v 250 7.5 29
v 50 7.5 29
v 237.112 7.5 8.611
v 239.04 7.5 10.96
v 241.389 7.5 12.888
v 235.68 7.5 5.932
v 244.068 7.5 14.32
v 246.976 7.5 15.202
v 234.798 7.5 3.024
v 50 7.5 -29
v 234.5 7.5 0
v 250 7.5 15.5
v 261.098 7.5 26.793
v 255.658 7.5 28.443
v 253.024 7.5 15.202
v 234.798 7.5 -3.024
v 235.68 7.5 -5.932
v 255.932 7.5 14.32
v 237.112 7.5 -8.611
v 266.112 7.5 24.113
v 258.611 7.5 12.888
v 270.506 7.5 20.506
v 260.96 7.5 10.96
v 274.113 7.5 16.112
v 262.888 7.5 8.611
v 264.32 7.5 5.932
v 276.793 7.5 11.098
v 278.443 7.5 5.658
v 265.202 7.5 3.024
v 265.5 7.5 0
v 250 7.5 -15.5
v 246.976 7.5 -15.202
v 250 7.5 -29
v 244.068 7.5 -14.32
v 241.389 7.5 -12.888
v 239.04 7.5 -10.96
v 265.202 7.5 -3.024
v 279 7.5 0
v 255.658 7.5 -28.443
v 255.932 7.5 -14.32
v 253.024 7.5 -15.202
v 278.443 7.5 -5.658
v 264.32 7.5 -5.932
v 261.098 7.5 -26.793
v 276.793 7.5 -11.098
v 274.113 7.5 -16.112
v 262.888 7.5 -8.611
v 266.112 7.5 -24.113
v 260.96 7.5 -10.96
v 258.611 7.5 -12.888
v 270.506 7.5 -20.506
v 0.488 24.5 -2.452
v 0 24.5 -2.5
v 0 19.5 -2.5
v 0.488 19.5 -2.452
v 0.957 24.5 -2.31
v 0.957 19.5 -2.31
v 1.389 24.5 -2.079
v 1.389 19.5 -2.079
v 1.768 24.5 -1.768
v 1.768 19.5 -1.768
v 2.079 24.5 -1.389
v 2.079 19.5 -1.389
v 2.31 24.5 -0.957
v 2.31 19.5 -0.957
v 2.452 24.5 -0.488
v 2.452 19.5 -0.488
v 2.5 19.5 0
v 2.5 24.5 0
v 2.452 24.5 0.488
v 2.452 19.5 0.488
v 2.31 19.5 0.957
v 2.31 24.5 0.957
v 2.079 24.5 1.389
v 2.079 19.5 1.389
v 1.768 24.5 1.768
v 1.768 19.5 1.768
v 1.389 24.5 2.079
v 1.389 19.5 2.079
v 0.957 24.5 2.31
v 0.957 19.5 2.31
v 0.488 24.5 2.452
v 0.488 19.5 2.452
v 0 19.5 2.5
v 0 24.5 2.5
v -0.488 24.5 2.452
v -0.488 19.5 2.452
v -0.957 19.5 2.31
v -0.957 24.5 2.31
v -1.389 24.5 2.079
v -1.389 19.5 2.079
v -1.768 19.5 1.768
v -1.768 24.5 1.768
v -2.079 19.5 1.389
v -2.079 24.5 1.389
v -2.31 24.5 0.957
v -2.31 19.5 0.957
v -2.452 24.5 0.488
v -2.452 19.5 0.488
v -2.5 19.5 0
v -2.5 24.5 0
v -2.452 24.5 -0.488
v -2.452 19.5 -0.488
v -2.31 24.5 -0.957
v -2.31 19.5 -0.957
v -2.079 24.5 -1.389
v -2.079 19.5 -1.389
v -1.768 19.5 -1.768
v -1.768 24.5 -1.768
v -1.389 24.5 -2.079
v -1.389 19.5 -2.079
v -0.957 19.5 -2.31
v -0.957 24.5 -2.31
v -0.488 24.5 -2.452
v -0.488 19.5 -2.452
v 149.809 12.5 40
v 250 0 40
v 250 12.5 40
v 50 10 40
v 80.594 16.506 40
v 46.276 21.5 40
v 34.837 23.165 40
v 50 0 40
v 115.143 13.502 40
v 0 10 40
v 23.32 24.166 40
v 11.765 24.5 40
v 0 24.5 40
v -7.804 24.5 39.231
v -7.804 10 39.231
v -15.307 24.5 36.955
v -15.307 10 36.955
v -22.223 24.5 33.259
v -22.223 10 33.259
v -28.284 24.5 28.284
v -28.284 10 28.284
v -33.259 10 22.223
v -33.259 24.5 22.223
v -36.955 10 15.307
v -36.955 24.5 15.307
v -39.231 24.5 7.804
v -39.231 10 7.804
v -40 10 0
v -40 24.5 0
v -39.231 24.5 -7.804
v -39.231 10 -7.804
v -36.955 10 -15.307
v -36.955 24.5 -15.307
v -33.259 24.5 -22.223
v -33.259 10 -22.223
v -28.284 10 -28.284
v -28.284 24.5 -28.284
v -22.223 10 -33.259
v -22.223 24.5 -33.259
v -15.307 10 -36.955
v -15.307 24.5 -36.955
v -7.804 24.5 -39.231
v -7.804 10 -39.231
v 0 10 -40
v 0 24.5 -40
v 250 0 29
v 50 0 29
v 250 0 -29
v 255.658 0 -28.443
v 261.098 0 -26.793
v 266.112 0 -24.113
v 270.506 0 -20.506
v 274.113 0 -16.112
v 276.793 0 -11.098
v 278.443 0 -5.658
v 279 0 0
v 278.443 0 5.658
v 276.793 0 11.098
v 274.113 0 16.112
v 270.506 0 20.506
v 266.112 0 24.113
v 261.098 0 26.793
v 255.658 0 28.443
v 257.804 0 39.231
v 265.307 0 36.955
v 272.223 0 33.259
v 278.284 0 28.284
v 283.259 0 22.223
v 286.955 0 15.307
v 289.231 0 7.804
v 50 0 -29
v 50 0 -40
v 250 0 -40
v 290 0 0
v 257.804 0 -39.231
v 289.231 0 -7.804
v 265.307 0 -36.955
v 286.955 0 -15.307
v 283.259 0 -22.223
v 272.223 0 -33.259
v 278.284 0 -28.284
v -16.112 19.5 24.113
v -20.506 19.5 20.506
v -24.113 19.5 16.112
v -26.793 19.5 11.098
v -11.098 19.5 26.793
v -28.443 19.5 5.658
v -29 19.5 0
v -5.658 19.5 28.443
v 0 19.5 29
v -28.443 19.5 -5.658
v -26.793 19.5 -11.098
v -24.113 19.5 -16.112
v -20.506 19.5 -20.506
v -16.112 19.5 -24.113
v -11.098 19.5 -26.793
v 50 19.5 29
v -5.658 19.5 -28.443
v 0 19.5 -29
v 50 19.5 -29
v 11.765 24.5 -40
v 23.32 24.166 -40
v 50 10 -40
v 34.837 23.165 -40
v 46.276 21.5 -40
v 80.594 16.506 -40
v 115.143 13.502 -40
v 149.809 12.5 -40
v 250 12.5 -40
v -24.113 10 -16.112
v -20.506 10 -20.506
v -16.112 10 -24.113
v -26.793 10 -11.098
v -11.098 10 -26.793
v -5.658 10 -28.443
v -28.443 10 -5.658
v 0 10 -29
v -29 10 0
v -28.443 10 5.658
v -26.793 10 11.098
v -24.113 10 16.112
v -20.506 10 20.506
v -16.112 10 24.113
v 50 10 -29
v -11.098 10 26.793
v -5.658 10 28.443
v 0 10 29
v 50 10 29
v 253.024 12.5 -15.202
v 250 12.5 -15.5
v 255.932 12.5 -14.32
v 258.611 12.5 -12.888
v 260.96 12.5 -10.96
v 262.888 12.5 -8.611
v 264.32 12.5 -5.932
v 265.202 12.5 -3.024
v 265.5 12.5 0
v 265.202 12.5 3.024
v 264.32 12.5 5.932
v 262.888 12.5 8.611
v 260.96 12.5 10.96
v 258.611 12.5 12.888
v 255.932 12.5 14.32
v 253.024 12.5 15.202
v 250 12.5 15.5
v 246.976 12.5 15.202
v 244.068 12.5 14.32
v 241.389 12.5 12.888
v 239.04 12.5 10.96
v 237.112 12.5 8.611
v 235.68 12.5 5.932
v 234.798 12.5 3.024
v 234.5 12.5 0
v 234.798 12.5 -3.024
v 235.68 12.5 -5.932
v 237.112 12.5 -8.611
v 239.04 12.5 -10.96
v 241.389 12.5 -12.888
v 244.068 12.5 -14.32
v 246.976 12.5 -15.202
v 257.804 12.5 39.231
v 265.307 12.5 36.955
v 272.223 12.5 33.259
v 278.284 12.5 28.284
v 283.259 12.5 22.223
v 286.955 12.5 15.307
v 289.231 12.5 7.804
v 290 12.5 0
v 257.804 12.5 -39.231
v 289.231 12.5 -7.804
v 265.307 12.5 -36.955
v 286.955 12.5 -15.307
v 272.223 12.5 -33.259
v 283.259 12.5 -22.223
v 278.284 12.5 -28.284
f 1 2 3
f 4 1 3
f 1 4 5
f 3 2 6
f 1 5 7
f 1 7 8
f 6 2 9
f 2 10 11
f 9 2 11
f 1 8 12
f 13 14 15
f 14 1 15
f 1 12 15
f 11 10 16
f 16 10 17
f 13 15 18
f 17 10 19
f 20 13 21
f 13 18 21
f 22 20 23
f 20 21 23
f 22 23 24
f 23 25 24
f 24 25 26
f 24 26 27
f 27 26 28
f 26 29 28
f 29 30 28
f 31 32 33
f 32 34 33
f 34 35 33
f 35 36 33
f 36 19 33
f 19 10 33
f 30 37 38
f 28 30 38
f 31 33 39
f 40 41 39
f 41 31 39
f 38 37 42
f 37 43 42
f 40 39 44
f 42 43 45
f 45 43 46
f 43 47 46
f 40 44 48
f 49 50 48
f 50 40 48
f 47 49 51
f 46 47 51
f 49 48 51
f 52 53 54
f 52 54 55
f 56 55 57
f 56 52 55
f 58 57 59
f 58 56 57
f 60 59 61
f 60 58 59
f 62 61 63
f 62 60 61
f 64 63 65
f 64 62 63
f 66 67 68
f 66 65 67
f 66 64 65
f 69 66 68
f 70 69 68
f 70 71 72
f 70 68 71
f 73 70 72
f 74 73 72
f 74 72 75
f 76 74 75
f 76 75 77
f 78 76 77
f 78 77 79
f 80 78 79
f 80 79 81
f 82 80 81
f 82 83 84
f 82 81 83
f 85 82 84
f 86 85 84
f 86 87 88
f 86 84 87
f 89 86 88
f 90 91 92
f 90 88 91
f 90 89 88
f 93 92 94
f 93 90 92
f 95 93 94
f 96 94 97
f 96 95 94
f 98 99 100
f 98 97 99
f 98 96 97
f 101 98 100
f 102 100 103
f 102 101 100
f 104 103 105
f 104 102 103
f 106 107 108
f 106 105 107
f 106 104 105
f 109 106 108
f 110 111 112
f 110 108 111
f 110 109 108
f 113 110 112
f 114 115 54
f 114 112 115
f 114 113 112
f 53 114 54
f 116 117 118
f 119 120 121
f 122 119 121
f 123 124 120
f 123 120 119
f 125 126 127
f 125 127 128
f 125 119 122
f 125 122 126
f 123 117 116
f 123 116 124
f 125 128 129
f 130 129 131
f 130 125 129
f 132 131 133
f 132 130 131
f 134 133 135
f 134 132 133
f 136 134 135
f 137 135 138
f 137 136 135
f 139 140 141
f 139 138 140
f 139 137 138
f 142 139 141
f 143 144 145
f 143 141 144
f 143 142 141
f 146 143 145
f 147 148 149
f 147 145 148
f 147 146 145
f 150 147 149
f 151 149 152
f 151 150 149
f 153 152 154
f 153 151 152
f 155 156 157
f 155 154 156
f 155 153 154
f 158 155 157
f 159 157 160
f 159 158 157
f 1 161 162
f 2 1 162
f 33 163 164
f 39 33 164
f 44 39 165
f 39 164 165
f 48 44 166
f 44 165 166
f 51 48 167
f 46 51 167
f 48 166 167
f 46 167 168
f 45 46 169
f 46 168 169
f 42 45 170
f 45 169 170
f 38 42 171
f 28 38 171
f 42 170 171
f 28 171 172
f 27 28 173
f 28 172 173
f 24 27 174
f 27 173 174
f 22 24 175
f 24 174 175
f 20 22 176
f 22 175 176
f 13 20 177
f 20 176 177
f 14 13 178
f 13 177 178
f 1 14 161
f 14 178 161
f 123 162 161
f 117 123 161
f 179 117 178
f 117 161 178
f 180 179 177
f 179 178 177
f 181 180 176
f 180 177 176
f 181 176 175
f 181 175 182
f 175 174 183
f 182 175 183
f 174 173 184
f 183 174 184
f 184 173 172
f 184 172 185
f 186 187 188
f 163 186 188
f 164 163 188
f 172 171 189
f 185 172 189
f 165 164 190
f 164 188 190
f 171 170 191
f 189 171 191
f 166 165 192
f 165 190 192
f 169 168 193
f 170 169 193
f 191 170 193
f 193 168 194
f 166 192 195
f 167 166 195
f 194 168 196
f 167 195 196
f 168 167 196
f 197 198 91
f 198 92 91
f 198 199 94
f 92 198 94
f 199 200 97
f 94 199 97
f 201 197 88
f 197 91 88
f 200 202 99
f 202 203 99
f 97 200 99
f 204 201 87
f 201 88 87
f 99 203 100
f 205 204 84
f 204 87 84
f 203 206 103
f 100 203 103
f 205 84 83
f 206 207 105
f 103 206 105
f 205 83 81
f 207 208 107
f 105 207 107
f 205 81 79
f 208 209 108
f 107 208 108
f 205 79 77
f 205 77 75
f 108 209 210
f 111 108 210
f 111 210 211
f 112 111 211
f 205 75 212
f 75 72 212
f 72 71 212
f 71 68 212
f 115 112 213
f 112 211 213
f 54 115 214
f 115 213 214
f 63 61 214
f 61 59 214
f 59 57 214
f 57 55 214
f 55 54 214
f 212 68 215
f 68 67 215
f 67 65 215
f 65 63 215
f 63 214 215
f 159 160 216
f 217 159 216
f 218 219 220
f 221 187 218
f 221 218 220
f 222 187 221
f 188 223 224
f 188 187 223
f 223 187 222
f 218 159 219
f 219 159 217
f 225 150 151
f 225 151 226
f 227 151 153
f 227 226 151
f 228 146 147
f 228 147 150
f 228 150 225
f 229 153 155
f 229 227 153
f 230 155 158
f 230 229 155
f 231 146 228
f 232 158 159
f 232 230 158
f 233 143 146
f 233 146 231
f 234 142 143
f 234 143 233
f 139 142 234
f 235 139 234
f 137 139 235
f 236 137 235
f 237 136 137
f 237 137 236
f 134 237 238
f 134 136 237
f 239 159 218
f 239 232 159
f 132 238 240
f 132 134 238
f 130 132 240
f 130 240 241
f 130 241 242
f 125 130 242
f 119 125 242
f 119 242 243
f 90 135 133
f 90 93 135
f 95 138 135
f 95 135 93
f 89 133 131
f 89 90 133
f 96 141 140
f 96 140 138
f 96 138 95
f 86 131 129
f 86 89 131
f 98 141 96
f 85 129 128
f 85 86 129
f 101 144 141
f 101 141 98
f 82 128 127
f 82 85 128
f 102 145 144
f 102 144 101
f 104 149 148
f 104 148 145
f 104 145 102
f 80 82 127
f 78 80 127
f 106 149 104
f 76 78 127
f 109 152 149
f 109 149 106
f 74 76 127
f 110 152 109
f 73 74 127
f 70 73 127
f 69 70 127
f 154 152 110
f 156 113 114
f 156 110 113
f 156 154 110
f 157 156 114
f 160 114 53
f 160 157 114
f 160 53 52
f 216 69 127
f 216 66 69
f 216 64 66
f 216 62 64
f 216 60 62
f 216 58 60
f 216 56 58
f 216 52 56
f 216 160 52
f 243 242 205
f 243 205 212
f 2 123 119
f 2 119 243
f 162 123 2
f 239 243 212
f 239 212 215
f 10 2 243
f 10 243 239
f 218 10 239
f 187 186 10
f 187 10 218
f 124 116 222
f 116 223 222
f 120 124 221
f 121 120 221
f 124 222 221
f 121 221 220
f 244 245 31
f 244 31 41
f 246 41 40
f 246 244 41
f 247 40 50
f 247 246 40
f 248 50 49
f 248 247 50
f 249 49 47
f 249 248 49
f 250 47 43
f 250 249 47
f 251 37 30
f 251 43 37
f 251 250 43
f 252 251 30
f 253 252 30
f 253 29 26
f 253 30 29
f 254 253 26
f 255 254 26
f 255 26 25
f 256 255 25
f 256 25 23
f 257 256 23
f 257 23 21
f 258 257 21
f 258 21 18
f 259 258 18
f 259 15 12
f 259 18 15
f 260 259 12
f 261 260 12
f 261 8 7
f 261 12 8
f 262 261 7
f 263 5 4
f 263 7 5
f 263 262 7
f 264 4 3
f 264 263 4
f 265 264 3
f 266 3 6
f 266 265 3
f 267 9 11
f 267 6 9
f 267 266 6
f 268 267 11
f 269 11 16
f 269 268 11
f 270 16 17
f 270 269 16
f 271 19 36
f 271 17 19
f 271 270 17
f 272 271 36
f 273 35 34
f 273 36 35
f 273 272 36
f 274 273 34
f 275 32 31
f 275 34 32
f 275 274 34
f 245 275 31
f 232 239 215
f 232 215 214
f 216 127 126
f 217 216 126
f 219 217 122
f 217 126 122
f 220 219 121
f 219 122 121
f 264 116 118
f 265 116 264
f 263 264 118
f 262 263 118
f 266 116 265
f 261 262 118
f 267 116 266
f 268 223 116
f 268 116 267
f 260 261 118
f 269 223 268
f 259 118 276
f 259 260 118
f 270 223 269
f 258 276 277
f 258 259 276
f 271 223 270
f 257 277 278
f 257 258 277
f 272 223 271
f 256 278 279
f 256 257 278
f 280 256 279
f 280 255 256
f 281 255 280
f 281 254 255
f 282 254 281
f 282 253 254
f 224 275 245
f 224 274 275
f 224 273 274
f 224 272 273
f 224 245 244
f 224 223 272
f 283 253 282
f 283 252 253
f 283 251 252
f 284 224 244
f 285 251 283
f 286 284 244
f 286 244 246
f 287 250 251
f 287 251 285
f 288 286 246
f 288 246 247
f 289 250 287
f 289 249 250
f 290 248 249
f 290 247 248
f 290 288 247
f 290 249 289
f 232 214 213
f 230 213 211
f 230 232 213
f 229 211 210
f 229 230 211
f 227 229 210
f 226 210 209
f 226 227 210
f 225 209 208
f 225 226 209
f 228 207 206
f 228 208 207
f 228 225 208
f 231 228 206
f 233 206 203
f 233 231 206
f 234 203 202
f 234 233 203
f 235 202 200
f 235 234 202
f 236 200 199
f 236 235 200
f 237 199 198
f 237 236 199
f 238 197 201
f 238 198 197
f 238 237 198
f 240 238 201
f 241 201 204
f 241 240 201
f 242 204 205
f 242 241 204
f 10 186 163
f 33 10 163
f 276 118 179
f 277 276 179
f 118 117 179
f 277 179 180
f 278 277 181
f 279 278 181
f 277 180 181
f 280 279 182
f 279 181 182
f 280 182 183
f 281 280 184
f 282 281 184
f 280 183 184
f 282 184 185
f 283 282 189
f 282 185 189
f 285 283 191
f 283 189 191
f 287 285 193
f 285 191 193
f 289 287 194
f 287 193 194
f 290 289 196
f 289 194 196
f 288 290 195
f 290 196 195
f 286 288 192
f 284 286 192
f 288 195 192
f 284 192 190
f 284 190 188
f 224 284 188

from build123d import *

# Parameters (mm, degrees)
BOSS_EXTRUDE1_DEPTH     = 7.5
CUT_EXTRUDE1_DEPTH      = 293.841680776
CUT_EXTRUDE1_DEPTH_BACK = 293.841680776
BOSS_EXTRUDE3_DEPTH     = 5
CUT_EXTRUDE2_DEPTH      = 293.841680776
CUT_EXTRUDE2_DEPTH_BACK = 293.841680776
SKETCH11_R              = 15.5
SKETCH12_W              = 30
SKETCH12_H              = 11
SKETCH12_H_2            = 58
BOSS_EXTRUDE4_DEPTH     = 7
BOSS_EXTRUDE5_DEPTH     = 5
BOSS_EXTRUDE6_START     = 2.5
BOSS_EXTRUDE6_DEPTH     = 2.5
CUT_EXTRUDE3_DEPTH      = 294.394359182
CUT_EXTRUDE3_DEPTH_BACK = 294.394359182
SKETCH15_R              = 2.5
FILLET1_R               = 200
FILLET2_R               = 600


with BuildPart() as part:
    # Sketch1 → Boss-Extrude1 (new body)
    with BuildSketch(Plane(origin=(0, 0, 0), x_dir=(1, 0, 0), z_dir=(0, 1, 0))):
        with BuildLine():
            Line((0, -40), (250, -40))
            ThreePointArc((250, -40), (290, 0), (250, 40))
            Line((250, 40), (0, 40))
            ThreePointArc((0, 40), (-40, 0), (0, -40))
        make_face()
        with BuildLine():
            Line((0, 29), (250, 29))
            ThreePointArc((250, 29), (279, 0), (250, -29))
            Line((250, -29), (0, -29))
            ThreePointArc((0, -29), (-29, 0), (0, 29))
        make_face(mode=Mode.SUBTRACT)
    extrude(amount=BOSS_EXTRUDE1_DEPTH)

    # Sketch9 → Cut-Extrude1 (cut, two sides: drawn at the far end of the back side and taken through both)
    with BuildSketch(Plane(origin=(0, 7.5, 0), x_dir=(1, 0, 0), z_dir=(0, 1, 0)).offset(-CUT_EXTRUDE1_DEPTH_BACK)):
        with BuildLine():
            Line((50, 29), (50, -29))
            Line((50, -29), (250, -29))
            ThreePointArc((250, -29), (279, 0), (250, 29))
            Line((250, 29), (50, 29))
        make_face()
        with BuildLine():
            Line((0, -40), (50, -40))
            Line((50, -40), (50, -29))
            Line((50, -29), (0, -29))
            ThreePointArc((0, -29), (-29, 0), (0, 29))
            Line((0, 29), (50, 29))
            Line((50, 29), (50, 40))
            Line((50, 40), (0, 40))
            ThreePointArc((0, 40), (-40, 0), (0, -40))
        make_face()
    extrude(amount=CUT_EXTRUDE1_DEPTH + CUT_EXTRUDE1_DEPTH_BACK, mode=Mode.SUBTRACT)

    # Sketch9<3> → Boss-Extrude3 (add)
    with BuildSketch(Plane(origin=(0, 7.5, 0), x_dir=(1, 0, 0), z_dir=(0, 1, 0))):
        with BuildLine():
            Line((50, 40), (50, -40))
            Line((50, -40), (250, -40))
            ThreePointArc((250, -40), (290, 0), (250, 40))
            Line((250, 40), (50, 40))
        make_face()
    extrude(amount=BOSS_EXTRUDE3_DEPTH)

    # Sketch11 → Cut-Extrude2 (cut, two sides: drawn at the far end of the back side and taken through both)
    with BuildSketch(Plane.XZ.offset(-7.5).offset(-CUT_EXTRUDE2_DEPTH_BACK)):
        with Locations(Location((250, 0, 0), (0, 0, 270))):
            Circle(SKETCH11_R)
    extrude(amount=CUT_EXTRUDE2_DEPTH + CUT_EXTRUDE2_DEPTH_BACK, mode=Mode.SUBTRACT)

    # Sketch12 → Boss-Extrude4 (add)
    with BuildSketch(Plane(origin=(0, 12.5, 0), x_dir=(1, 0, 0), z_dir=(0, 1, 0))):
        with Locations((65, -34.5)):
            Rectangle(SKETCH12_W, SKETCH12_H)
        with BuildLine():
            ThreePointArc((0, 40), (-40, 0), (0, -40))
            Line((0, -40), (50, -40))
            Line((50, -40), (50, -29))
            Line((50, -29), (0, -29))
            ThreePointArc((0, -29), (-29, 0), (0, 29))
            Line((0, 29), (50, 29))
            Line((50, 29), (50, 40))
            Line((50, 40), (0, 40))
        make_face()
        with Locations((65, 34.5)):
            Rectangle(SKETCH12_W, SKETCH12_H)
        with Locations((65, 0)):
            Rectangle(SKETCH12_W, SKETCH12_H_2)
    extrude(amount=BOSS_EXTRUDE4_DEPTH)

    # Sketch13 → Boss-Extrude5 (add)
    with BuildSketch(Plane(origin=(0, 19.5, 0), x_dir=(1, 0, 0), z_dir=(0, 1, 0))):
        with BuildLine():
            Line((80, -40), (80, 40))
            Line((80, 40), (0, 40))
            ThreePointArc((0, 40), (-40, 0), (0, -40))
            Line((0, -40), (80, -40))
        make_face()
    extrude(amount=BOSS_EXTRUDE5_DEPTH)

    # Sketch14 → Boss-Extrude6 (add)
    with BuildSketch(Plane.XZ.offset(-12.5).offset(BOSS_EXTRUDE6_START)):
        with BuildLine():
            Line((0, -40), (50, -40))
            Line((50, -40), (50, -29))
            Line((50, -29), (0, -29))
            ThreePointArc((0, -29), (-29, 0), (0, 29))
            Line((0, 29), (50, 29))
            Line((50, 29), (50, 40))
            Line((50, 40), (0, 40))
            ThreePointArc((0, 40), (-40, 0), (0, -40))
        make_face()
    extrude(amount=-BOSS_EXTRUDE6_DEPTH)

    # Sketch15 → Cut-Extrude3 (cut, two sides: drawn at the far end of the back side and taken through both)
    with BuildSketch(Plane.XZ.offset(-19.5).offset(-CUT_EXTRUDE3_DEPTH_BACK)):
        with Locations(Location((0, 0, 0), (0, 0, 270))):
            Circle(SKETCH15_R)
    extrude(amount=CUT_EXTRUDE3_DEPTH + CUT_EXTRUDE3_DEPTH_BACK, mode=Mode.SUBTRACT)

    # Fillet1
    # the kernel refuses this fillet: 200 mm, written as the material it takes off along each edge
    with BuildSketch(Plane(origin=(80, 24.5, 210.587221092), x_dir=(0, -1, 0), z_dir=(0, 0, -1))) as fillet1_piece_1:
        with BuildLine():
            CenterArc((200, 68.234888437), FILLET1_R, 180, 19.948443589)
            Line((0, 68.234888437), (-4, 68.234888437))
            Line((-4, 68.234888437), (-4, 0))
            Line((-4, 0), (0, -4))
            ThreePointArc((0, -4), (6, -4), (8.24, -1.364697769))
            Line((8.24, -1.364697769), (12, 0))
        make_face()
    extrude(amount=421.174442185, mode=Mode.SUBTRACT)

    # Fillet2
    fillet2_edges = [part.edges().sort_by_distance(p)[0] for p in [
        (80, 12.5, 0),
    ]]
    fillet(fillet2_edges, radius=FILLET2_R)


solid = part.part
